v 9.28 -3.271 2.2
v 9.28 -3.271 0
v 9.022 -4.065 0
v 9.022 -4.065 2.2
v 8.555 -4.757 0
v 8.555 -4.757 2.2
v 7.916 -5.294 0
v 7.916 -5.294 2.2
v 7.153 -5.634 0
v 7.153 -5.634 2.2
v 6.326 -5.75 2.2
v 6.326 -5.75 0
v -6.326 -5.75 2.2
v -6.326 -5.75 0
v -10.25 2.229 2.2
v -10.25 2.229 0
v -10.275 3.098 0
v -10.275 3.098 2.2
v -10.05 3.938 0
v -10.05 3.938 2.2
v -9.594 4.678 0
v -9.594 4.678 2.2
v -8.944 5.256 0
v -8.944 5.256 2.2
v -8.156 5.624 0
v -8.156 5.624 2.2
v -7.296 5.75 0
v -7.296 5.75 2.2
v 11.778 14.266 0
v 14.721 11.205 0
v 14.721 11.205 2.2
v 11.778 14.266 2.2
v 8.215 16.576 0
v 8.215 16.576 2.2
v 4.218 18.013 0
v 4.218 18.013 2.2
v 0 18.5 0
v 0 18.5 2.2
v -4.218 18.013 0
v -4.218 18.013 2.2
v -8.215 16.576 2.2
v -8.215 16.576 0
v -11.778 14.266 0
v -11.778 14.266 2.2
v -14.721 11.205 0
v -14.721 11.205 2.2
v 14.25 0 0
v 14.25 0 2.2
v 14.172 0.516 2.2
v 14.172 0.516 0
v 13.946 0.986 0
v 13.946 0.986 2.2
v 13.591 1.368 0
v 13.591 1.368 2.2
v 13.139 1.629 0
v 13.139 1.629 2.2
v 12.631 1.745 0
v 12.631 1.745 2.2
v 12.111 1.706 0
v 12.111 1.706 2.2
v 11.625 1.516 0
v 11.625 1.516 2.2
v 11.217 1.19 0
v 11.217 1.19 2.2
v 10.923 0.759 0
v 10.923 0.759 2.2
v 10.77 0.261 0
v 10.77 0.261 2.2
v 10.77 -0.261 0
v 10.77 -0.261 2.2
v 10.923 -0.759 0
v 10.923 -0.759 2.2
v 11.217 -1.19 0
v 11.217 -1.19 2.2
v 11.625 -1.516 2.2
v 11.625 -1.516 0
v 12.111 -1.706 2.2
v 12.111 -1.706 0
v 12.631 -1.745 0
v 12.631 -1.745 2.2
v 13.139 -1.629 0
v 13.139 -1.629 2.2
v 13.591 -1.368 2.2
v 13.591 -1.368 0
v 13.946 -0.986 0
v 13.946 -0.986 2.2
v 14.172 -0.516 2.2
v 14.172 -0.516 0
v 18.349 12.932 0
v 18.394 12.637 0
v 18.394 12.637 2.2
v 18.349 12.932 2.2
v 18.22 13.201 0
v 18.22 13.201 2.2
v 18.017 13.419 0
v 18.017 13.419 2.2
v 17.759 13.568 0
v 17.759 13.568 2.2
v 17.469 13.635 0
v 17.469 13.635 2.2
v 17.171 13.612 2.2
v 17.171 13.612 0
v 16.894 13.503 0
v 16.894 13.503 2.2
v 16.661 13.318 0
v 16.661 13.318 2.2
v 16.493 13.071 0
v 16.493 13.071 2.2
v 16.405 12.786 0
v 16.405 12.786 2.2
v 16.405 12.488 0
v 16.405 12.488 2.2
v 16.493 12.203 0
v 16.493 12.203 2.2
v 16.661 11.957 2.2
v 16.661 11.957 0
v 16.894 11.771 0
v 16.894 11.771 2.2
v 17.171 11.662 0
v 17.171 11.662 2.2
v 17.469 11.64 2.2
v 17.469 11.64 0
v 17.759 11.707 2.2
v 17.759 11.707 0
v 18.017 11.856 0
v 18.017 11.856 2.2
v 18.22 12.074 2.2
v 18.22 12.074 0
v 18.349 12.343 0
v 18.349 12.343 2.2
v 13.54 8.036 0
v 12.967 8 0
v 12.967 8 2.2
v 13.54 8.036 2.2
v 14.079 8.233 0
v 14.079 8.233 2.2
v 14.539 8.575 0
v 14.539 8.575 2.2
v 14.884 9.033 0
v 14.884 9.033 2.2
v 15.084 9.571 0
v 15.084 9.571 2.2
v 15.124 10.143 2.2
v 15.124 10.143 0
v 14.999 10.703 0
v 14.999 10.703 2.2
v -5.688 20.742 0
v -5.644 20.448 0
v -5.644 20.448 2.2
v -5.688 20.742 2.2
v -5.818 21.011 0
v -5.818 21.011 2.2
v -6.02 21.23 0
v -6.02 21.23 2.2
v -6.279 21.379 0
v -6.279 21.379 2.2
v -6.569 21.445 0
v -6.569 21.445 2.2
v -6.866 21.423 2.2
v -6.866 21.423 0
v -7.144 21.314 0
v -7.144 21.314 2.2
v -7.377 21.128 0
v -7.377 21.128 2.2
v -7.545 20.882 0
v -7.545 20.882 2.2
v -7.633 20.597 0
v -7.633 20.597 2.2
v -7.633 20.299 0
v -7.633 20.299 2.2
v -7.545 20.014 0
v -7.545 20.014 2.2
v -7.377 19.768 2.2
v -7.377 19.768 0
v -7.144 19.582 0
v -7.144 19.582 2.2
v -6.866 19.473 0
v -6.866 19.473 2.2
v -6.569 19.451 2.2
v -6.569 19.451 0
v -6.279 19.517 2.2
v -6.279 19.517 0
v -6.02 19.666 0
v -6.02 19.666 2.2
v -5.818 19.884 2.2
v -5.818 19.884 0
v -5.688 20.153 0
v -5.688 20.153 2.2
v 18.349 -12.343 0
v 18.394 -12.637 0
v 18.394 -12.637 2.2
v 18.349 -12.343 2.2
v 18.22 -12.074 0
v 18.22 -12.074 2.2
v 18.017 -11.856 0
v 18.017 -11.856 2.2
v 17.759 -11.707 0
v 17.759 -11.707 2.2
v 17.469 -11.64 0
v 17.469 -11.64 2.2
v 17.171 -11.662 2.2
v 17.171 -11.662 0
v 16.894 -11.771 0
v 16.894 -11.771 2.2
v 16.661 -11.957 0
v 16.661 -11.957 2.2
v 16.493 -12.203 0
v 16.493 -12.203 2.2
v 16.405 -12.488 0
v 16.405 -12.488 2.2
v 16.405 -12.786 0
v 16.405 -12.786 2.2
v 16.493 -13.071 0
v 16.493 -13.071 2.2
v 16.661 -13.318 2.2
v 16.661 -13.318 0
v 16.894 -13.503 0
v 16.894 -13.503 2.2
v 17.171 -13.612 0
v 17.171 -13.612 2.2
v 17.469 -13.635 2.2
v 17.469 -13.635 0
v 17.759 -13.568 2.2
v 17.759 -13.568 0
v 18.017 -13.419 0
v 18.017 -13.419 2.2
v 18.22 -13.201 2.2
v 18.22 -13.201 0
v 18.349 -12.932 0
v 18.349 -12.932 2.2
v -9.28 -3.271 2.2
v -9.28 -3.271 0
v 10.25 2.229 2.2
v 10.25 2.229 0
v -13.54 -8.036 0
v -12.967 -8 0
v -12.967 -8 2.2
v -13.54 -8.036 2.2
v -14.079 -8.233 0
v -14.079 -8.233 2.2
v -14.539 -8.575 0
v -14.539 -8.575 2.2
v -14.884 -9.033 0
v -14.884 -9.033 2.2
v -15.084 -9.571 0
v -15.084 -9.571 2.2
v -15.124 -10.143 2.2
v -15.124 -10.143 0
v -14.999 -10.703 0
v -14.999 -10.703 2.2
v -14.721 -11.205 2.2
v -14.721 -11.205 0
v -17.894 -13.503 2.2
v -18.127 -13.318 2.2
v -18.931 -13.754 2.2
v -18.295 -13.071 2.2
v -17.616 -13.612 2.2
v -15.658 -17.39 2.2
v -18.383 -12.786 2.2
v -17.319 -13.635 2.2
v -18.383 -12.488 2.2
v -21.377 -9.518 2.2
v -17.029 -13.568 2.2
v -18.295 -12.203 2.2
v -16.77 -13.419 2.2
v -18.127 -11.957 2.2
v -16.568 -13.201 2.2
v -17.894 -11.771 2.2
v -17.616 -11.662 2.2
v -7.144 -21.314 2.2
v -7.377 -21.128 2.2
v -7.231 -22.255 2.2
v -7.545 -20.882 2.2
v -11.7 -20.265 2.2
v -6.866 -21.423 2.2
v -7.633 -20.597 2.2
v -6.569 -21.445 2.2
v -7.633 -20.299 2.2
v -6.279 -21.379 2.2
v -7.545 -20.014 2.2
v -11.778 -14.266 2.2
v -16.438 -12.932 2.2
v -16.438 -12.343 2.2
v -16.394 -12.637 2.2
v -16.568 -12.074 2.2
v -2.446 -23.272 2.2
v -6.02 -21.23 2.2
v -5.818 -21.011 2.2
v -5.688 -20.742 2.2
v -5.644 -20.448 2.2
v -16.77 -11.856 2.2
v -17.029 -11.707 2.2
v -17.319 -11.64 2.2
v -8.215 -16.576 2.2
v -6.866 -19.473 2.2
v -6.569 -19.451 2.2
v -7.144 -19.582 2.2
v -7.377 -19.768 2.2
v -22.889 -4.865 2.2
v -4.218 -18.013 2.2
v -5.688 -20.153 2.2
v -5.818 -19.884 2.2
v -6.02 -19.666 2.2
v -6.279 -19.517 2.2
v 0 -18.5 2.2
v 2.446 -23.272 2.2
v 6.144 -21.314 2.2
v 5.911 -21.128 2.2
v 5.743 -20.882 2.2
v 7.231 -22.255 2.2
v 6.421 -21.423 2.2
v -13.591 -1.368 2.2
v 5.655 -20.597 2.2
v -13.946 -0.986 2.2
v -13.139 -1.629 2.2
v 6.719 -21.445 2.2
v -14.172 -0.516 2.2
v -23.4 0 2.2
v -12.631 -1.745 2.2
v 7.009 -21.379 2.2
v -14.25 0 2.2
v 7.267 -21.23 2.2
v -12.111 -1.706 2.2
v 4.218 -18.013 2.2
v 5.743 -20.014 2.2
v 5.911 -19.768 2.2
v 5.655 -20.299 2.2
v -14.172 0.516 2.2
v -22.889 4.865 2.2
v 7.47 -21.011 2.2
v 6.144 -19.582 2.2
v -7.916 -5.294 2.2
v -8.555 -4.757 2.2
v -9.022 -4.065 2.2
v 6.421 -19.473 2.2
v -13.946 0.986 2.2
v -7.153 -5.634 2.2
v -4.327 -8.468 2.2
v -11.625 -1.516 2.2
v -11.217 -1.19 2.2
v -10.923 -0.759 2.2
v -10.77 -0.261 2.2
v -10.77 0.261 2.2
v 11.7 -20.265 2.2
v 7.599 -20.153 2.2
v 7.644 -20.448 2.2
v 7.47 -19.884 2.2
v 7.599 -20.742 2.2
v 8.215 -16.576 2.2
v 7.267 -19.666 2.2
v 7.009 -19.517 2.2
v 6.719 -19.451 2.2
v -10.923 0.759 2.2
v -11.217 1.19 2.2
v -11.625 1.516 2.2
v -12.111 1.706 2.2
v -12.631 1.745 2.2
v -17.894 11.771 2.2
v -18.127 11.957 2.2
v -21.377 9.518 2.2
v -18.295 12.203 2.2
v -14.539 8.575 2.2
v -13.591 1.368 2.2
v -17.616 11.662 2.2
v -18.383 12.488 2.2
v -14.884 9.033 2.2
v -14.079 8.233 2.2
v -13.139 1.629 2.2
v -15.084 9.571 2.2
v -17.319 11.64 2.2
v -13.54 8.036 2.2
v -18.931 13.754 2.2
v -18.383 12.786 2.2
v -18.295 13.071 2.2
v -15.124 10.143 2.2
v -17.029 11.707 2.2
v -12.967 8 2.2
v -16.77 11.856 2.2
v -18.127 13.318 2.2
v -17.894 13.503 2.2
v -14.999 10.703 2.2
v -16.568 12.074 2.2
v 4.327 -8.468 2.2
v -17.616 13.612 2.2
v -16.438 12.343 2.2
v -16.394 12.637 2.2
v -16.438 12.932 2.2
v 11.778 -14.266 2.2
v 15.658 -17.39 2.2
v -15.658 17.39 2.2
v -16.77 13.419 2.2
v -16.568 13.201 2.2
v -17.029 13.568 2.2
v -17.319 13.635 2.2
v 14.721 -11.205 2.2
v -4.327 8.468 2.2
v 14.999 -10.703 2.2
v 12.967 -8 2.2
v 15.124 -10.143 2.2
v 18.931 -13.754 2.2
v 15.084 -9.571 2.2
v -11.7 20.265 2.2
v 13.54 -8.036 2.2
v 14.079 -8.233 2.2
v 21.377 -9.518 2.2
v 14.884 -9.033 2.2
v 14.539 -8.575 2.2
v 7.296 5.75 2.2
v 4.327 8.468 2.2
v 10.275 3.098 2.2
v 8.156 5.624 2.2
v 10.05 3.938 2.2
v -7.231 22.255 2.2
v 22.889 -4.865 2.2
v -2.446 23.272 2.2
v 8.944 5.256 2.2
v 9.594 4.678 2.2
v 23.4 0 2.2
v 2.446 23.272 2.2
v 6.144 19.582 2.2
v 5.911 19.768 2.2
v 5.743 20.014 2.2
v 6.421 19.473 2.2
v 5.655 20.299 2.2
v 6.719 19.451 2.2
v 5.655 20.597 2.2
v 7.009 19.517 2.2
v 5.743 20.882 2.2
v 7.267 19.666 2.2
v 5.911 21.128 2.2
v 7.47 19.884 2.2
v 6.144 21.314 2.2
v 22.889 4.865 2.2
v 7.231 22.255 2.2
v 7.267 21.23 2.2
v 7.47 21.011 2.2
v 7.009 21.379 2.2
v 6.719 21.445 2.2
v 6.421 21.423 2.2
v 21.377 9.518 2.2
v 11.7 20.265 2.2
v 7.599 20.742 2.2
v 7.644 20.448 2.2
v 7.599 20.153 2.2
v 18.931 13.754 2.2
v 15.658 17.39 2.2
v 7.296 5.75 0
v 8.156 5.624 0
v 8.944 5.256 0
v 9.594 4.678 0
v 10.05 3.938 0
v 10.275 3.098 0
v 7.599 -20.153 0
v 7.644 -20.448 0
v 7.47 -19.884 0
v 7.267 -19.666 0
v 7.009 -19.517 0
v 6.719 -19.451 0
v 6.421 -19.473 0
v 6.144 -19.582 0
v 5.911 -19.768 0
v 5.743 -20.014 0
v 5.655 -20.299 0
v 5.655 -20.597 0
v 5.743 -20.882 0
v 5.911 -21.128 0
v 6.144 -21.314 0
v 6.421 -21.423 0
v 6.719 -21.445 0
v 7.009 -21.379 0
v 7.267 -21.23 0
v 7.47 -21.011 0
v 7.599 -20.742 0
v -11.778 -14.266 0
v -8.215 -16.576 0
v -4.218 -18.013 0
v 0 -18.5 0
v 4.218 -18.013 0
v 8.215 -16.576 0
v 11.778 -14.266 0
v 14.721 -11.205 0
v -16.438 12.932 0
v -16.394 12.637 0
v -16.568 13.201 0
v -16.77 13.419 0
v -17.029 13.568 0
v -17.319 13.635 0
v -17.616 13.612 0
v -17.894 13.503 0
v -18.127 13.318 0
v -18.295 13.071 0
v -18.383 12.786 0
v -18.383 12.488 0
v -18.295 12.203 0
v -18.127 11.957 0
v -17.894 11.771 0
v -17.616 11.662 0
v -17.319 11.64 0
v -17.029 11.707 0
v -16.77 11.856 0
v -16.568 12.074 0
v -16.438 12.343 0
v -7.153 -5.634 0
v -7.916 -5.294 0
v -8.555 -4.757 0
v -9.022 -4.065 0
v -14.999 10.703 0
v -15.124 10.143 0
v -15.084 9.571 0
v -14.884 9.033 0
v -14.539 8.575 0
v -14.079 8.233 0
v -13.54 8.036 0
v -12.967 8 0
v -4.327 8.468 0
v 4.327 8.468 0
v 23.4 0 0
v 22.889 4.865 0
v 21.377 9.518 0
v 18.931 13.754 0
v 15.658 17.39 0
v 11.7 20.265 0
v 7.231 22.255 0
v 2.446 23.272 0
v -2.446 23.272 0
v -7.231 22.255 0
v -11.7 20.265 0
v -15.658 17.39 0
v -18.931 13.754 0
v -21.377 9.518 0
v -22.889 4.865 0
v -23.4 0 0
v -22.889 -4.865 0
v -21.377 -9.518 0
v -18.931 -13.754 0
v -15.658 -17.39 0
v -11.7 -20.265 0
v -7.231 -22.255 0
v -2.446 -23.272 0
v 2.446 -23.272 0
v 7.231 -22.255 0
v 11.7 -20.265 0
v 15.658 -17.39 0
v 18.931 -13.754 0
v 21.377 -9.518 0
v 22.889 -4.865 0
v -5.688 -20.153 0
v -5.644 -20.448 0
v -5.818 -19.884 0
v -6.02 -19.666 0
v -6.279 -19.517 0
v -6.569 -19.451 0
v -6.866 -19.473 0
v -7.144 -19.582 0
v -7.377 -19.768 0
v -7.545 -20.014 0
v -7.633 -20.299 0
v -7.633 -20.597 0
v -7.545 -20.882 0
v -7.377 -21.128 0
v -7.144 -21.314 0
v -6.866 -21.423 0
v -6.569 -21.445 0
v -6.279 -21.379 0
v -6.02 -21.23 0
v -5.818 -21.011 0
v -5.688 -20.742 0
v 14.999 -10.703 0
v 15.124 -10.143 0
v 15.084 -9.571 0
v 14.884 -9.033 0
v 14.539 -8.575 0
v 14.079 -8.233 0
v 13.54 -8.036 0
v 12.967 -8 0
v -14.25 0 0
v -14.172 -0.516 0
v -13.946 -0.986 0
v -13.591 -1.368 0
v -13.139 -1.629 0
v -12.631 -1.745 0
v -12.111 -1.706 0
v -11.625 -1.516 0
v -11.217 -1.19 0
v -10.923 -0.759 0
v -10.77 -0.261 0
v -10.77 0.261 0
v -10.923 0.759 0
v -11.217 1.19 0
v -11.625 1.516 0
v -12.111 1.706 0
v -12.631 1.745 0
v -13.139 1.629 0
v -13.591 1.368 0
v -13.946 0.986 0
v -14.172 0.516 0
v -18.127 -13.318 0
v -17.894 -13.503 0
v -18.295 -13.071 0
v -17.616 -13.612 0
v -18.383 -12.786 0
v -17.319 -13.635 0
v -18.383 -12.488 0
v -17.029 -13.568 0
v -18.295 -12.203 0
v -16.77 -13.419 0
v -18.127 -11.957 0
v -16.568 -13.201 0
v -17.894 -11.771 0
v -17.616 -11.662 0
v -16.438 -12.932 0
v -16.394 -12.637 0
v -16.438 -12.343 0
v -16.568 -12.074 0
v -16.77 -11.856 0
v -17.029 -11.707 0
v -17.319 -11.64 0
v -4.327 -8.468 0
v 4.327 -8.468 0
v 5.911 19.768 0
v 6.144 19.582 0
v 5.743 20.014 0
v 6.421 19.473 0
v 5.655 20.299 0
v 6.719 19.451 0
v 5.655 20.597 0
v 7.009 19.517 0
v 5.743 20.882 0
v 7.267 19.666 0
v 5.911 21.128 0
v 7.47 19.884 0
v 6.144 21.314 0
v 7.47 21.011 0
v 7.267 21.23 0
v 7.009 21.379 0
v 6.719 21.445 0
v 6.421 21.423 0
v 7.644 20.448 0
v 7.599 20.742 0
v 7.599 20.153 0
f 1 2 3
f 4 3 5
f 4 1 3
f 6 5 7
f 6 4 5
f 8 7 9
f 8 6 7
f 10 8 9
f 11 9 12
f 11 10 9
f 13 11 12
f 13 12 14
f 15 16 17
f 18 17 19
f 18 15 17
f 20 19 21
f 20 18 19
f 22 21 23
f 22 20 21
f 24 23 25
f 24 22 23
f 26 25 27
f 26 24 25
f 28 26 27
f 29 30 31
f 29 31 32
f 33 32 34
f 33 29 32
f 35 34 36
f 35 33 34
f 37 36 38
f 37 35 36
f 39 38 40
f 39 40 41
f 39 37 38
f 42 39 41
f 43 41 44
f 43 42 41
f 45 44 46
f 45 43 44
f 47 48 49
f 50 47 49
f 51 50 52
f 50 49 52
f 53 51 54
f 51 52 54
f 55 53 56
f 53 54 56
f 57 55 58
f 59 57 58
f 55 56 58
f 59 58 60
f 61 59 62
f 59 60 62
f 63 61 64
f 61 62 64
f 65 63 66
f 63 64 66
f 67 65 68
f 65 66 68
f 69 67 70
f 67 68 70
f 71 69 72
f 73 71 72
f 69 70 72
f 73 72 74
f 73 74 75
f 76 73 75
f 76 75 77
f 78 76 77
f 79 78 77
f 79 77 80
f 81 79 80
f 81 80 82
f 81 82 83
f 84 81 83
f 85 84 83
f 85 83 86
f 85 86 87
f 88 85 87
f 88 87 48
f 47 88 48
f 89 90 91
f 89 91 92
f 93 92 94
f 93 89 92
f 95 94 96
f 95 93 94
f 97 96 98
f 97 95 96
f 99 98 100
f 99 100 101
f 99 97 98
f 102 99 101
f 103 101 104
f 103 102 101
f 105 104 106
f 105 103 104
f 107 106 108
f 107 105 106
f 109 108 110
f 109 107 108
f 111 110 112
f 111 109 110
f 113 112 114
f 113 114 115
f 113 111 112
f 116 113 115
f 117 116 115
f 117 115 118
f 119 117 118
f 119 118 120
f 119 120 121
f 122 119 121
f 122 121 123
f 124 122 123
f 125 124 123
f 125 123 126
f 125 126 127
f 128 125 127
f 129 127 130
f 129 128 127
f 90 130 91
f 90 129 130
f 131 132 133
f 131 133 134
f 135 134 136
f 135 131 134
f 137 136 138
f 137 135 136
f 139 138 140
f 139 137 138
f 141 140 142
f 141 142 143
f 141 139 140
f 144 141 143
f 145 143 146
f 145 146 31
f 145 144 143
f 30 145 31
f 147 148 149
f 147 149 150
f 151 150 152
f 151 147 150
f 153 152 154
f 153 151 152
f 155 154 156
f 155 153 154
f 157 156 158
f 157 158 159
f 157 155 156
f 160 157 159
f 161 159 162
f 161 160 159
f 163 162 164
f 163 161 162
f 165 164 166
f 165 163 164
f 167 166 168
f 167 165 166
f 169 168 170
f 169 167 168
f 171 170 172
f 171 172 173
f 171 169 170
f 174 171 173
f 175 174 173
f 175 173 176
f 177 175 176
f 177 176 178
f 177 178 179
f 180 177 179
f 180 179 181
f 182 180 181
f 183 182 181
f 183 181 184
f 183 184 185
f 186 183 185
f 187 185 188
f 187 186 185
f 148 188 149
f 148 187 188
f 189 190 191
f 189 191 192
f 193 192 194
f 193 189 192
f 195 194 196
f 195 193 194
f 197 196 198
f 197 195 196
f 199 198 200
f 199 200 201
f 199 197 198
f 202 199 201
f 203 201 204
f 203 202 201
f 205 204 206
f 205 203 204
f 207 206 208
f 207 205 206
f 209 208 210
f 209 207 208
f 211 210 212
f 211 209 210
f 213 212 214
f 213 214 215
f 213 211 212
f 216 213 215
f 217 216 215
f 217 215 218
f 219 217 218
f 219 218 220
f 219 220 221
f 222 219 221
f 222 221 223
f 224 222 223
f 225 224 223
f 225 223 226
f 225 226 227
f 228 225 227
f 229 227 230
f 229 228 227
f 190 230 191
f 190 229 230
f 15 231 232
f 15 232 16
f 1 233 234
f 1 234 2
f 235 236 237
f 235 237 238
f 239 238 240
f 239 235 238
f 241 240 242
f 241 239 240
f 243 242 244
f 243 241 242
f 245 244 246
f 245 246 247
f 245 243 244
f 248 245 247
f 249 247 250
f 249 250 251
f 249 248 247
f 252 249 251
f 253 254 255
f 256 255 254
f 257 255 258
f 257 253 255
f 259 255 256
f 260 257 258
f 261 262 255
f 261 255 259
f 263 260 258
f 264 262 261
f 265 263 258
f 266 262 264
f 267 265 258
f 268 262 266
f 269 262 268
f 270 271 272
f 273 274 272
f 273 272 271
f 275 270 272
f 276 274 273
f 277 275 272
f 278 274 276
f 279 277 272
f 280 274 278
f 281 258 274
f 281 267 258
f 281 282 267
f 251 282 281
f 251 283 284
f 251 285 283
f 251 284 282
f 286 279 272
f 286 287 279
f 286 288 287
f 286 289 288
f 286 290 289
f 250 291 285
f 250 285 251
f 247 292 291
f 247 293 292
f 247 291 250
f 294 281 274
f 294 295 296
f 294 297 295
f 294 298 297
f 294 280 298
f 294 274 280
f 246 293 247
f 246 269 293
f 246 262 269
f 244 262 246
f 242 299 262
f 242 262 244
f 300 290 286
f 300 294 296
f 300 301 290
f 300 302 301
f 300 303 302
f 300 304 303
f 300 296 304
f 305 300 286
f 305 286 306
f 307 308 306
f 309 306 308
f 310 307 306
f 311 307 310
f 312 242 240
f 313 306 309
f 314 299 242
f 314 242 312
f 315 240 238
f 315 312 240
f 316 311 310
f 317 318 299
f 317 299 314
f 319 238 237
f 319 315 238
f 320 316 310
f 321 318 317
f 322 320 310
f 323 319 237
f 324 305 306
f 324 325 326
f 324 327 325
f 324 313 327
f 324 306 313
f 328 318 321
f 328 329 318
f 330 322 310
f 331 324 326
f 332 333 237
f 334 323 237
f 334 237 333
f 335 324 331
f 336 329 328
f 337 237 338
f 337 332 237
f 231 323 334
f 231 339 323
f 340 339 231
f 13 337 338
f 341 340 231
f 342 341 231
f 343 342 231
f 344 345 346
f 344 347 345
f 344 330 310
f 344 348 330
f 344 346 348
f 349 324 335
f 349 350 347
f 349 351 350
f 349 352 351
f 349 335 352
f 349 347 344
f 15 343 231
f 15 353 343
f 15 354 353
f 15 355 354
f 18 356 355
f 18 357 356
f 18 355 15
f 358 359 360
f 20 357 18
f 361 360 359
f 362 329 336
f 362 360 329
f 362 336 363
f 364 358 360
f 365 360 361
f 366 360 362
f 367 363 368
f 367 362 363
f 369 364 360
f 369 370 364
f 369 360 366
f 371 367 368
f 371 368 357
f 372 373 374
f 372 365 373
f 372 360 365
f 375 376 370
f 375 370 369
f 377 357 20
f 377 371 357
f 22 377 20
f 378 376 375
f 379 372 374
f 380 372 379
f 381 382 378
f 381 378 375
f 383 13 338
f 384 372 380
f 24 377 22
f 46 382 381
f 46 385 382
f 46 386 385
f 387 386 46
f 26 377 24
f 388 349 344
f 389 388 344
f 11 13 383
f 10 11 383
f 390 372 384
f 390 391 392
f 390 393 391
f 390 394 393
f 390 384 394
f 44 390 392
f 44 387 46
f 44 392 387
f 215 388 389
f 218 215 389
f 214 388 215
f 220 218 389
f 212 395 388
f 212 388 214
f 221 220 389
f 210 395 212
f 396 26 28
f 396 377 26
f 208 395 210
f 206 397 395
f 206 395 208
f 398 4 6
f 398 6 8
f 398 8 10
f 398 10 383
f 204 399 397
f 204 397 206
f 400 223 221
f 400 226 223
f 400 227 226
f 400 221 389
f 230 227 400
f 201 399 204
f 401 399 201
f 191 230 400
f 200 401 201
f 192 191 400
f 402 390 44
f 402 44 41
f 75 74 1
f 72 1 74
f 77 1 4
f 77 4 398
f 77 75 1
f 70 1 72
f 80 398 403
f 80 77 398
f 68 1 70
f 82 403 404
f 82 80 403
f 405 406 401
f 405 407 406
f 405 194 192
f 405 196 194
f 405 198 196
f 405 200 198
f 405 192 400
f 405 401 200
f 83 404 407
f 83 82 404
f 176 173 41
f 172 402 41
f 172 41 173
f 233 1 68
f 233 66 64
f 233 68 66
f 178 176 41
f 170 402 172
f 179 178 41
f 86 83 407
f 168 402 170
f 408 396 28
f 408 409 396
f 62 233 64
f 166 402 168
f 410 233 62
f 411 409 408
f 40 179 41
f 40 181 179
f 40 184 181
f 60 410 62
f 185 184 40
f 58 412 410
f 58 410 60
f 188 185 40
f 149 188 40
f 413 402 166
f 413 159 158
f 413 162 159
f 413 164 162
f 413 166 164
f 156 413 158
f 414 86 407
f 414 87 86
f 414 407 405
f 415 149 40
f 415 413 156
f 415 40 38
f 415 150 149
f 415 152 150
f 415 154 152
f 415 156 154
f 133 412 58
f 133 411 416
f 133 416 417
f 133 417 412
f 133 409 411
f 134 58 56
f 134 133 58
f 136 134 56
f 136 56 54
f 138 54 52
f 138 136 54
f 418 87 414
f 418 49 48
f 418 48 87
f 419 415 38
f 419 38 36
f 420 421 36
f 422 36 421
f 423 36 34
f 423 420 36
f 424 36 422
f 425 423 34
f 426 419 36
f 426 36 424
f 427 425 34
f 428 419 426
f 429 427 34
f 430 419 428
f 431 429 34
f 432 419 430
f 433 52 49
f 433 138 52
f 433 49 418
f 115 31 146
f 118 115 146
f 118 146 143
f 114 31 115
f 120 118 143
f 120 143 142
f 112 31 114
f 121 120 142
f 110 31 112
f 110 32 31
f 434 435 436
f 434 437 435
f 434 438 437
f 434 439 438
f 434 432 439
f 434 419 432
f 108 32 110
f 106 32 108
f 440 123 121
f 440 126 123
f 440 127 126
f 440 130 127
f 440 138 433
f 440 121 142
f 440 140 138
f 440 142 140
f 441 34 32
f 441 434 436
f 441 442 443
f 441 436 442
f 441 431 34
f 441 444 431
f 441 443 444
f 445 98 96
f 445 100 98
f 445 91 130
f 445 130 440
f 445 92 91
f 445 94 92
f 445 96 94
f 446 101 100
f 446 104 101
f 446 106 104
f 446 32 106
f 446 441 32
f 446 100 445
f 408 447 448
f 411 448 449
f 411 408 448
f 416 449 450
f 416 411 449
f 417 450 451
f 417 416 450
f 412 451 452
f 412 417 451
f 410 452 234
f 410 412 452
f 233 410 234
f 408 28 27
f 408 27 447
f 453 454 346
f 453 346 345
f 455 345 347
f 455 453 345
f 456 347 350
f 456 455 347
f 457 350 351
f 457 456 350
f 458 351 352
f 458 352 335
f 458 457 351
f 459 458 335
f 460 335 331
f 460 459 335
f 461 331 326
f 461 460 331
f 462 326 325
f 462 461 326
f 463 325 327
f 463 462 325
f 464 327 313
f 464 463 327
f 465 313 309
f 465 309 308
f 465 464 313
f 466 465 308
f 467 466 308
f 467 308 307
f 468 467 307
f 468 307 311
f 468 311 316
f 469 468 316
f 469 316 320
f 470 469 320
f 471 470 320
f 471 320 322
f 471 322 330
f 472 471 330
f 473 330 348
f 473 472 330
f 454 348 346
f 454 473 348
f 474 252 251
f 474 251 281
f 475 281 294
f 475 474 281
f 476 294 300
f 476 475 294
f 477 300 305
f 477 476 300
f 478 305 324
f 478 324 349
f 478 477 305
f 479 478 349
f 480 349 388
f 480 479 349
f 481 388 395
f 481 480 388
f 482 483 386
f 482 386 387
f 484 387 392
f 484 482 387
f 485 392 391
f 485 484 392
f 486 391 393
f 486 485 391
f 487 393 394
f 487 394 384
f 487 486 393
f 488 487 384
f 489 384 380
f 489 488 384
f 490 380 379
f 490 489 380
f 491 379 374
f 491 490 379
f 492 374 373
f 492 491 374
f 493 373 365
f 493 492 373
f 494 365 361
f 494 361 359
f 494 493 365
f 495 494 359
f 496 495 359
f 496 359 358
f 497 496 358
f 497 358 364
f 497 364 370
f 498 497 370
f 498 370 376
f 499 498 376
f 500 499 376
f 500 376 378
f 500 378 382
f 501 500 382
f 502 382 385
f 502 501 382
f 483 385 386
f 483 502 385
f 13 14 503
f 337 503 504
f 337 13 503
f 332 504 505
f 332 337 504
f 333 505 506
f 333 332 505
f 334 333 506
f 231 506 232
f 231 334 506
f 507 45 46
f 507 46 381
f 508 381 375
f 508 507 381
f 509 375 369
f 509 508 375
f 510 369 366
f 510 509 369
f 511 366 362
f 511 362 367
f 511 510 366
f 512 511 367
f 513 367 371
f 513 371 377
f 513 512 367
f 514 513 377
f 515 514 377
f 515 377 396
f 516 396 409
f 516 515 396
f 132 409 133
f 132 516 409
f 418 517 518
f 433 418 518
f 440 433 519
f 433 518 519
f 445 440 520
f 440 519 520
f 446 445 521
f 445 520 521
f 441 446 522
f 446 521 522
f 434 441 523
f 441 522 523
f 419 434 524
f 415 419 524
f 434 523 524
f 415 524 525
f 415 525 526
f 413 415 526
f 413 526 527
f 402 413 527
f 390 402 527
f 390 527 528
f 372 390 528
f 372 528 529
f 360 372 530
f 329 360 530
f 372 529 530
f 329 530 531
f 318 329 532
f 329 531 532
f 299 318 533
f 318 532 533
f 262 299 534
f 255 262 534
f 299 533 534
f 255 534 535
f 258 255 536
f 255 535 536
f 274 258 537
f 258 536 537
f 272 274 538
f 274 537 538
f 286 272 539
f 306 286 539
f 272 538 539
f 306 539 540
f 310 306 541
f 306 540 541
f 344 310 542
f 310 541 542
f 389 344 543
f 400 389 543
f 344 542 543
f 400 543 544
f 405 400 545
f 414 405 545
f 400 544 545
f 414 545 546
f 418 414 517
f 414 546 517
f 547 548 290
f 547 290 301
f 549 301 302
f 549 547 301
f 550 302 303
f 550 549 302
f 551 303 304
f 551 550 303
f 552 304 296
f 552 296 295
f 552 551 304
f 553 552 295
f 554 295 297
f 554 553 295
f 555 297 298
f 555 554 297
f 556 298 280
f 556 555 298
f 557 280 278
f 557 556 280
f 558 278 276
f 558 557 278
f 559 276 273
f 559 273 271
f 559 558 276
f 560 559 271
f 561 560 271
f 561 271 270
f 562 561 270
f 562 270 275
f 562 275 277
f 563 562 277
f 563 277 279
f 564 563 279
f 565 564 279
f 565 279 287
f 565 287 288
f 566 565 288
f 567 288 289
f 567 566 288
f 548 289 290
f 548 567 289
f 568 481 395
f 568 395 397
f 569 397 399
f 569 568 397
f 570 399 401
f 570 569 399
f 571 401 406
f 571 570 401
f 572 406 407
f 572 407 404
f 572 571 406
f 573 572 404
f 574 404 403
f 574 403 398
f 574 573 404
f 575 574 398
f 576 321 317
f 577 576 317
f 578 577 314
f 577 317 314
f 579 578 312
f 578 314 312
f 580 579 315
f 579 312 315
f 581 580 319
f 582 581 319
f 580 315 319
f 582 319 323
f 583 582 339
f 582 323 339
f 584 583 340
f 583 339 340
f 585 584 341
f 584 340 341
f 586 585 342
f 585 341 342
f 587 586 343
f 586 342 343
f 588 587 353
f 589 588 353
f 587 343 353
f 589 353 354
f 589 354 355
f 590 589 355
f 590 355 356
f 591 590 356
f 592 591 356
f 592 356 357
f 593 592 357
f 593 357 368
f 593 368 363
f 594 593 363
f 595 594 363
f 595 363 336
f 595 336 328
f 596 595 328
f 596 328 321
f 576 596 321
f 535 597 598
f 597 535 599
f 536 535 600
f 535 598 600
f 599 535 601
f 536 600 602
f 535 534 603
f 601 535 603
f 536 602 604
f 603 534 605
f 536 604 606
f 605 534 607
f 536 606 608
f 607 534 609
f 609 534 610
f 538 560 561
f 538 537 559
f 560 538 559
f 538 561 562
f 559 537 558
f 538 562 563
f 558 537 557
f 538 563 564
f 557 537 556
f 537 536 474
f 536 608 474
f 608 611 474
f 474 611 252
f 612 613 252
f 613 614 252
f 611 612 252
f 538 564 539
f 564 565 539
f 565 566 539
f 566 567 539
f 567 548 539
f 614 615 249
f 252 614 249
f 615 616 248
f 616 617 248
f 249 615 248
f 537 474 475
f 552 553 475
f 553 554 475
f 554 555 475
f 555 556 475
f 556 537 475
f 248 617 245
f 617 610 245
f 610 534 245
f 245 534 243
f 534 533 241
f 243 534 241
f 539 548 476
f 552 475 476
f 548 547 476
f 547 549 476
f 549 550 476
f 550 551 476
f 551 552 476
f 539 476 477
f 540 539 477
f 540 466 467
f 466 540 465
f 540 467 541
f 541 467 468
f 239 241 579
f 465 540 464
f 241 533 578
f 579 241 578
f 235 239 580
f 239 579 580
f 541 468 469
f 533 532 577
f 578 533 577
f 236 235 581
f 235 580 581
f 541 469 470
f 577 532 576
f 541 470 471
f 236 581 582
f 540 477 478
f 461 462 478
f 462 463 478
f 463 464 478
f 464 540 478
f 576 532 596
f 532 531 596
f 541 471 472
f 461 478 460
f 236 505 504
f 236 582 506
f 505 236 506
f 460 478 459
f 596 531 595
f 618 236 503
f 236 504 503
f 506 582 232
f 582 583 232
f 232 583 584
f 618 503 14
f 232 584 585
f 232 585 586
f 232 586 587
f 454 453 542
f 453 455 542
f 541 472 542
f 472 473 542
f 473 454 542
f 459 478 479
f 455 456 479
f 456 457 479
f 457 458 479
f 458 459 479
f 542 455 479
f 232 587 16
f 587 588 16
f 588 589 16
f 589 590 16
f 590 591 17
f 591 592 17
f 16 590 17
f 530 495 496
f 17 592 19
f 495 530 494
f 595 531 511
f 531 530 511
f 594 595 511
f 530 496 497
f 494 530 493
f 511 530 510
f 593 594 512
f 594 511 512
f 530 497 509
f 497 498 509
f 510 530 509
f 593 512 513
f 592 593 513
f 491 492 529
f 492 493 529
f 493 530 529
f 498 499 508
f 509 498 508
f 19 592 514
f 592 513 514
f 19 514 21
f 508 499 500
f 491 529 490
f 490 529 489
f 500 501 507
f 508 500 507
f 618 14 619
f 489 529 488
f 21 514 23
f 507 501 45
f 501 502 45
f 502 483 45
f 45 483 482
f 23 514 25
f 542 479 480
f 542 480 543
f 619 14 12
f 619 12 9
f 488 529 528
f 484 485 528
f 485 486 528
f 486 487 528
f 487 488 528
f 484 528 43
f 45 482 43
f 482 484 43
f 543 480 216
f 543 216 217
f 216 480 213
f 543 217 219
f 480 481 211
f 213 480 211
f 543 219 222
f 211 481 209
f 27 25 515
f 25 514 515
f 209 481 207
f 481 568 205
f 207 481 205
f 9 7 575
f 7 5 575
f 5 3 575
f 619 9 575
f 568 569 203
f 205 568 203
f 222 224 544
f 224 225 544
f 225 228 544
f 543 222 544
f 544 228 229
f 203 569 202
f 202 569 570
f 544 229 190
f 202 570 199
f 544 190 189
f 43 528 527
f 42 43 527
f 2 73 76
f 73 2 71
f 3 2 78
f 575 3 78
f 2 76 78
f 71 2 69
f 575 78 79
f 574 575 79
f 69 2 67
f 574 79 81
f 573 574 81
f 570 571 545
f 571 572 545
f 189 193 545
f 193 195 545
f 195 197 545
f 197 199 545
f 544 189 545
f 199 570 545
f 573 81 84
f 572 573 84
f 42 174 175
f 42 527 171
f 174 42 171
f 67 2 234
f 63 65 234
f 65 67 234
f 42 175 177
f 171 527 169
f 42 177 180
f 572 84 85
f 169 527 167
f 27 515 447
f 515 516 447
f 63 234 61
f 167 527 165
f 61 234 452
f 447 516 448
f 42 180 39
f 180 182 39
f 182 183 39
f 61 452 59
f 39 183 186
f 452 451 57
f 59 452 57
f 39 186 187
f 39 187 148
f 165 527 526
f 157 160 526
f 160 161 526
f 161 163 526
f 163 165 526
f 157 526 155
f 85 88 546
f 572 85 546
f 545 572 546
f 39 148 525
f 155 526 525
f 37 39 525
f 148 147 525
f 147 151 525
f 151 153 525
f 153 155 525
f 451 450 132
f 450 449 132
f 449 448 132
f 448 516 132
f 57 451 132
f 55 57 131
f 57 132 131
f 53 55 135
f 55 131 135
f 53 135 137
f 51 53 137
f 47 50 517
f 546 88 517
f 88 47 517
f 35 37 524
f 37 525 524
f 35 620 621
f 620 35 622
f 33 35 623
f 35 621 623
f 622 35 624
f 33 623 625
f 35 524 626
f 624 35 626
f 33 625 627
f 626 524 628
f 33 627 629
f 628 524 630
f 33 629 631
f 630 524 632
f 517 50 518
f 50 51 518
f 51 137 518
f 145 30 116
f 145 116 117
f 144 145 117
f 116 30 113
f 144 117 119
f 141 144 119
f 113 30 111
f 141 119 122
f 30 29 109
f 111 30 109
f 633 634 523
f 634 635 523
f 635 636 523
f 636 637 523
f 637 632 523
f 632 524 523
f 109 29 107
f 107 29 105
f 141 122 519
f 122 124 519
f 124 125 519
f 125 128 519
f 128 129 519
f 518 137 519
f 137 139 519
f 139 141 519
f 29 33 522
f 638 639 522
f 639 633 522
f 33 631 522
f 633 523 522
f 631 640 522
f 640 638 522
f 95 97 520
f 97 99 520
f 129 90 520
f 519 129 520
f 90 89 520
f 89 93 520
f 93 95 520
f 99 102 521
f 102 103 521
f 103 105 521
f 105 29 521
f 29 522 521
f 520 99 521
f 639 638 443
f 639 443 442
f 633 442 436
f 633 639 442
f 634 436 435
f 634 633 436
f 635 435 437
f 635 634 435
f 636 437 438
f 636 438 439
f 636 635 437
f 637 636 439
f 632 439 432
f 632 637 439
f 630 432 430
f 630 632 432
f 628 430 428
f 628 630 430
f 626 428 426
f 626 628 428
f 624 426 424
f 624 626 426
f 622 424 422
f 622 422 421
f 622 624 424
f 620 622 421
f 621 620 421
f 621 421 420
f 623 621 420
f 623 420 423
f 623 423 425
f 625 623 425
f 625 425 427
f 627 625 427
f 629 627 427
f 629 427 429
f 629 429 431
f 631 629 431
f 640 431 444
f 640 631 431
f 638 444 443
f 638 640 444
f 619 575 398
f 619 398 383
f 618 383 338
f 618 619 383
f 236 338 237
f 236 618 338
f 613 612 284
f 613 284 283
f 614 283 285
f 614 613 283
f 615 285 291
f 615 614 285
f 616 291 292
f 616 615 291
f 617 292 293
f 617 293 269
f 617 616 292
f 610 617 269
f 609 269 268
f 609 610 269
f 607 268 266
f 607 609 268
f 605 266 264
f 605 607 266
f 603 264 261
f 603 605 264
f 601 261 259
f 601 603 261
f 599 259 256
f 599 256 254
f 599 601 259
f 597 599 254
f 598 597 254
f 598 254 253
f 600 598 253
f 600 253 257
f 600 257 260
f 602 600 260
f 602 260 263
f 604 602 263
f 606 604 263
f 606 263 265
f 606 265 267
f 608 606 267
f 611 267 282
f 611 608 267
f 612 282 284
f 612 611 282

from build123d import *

# Parameters (mm, degrees)
SKIZZE1_R                       = 23.4
SKIZZE1_R_2                     = 1
LINEAR_AUSTRAGEN1_DEPTH         = 2.2
SKIZZE3_R                       = 1.75
SCHNITT_LINEAR_AUSTRAGEN3_DEPTH = 34.165644875


with BuildPart() as part:
    # Skizze1 → Linear austragen1 (new body)
    with BuildSketch(Plane.XY):
        Circle(SKIZZE1_R)
        with Locations((6.643865379, 20.4477151)):
            Circle(SKIZZE1_R_2, mode=Mode.SUBTRACT)
        with Locations((17.393865379, 12.637382924)):
            Circle(SKIZZE1_R_2, mode=Mode.SUBTRACT)
        with Locations((17.393865379, -12.637382924)):
            Circle(SKIZZE1_R_2, mode=Mode.SUBTRACT)
        with Locations((-6.643865379, 20.4477151)):
            Circle(SKIZZE1_R_2, mode=Mode.SUBTRACT)
        with Locations((6.643865379, -20.4477151)):
            Circle(SKIZZE1_R_2, mode=Mode.SUBTRACT)
        with Locations((-6.643865379, -20.4477151)):
            Circle(SKIZZE1_R_2, mode=Mode.SUBTRACT)
        with Locations((-17.393865379, -12.637382924)):
            Circle(SKIZZE1_R_2, mode=Mode.SUBTRACT)
        with Locations((-17.393865379, 12.637382924)):
            Circle(SKIZZE1_R_2, mode=Mode.SUBTRACT)
        with BuildLine():
            ThreePointArc((14.720859381, 11.20474449), (0, 18.5), (-14.720859381, 11.20474449))
            ThreePointArc((-14.720859381, 11.20474449), (-14.883940446, 9.033399462), (-12.967323579, 8))
            ThreePointArc((-12.967323579, 8), (0, 8.526339105), (12.967323579, 8))
            ThreePointArc((12.967323579, 8), (14.883940446, 9.033399462), (14.720859381, 11.20474449))
        make_face(mode=Mode.SUBTRACT)
        with BuildLine():
            ThreePointArc((-14.720859381, -11.20474449), (0, -18.5), (14.720859381, -11.20474449))
            ThreePointArc((14.720859381, -11.20474449), (14.883940446, -9.033399462), (12.967323579, -8))
            ThreePointArc((12.967323579, -8), (0, -8.526339105), (-12.967323579, -8))
            ThreePointArc((-12.967323579, -8), (-14.883940446, -9.033399462), (-14.720859381, -11.20474449))
        make_face(mode=Mode.SUBTRACT)
    extrude(amount=LINEAR_AUSTRAGEN1_DEPTH)

    # Skizze3 → Schnitt-Linear austragen3 (cut, through all)
    with BuildSketch(Plane.XY.offset(2.2)):
        with Locations((12.5, 0)):
            Circle(SKIZZE3_R)
        with Locations(Location((-12.5, 0, 0), (0, 0, 180))):
            Circle(SKIZZE3_R)
        with BuildLine():
            Line((-7.295576741, 5.75), (7.295576741, 5.75))
            ThreePointArc((7.295576741, 5.75), (9.59371007, 4.678362829), (10.25, 2.229055467))
            Line((10.25, 2.229055467), (9.280201606, -3.270944533))
            ThreePointArc((9.280201606, -3.270944533), (8.254141176, -5.048133329), (6.325778347, -5.75))
            Line((6.325778347, -5.75), (-6.325778347, -5.75))
            ThreePointArc((-6.325778347, -5.75), (-8.254141176, -5.048133329), (-9.280201606, -3.270944533))
            Line((-9.280201606, -3.270944533), (-10.25, 2.229055467))
            ThreePointArc((-10.25, 2.229055467), (-9.59371007, 4.678362829), (-7.295576741, 5.75))
        make_face()
    extrude(amount=-SCHNITT_LINEAR_AUSTRAGEN3_DEPTH, mode=Mode.SUBTRACT)


solid = part.part
